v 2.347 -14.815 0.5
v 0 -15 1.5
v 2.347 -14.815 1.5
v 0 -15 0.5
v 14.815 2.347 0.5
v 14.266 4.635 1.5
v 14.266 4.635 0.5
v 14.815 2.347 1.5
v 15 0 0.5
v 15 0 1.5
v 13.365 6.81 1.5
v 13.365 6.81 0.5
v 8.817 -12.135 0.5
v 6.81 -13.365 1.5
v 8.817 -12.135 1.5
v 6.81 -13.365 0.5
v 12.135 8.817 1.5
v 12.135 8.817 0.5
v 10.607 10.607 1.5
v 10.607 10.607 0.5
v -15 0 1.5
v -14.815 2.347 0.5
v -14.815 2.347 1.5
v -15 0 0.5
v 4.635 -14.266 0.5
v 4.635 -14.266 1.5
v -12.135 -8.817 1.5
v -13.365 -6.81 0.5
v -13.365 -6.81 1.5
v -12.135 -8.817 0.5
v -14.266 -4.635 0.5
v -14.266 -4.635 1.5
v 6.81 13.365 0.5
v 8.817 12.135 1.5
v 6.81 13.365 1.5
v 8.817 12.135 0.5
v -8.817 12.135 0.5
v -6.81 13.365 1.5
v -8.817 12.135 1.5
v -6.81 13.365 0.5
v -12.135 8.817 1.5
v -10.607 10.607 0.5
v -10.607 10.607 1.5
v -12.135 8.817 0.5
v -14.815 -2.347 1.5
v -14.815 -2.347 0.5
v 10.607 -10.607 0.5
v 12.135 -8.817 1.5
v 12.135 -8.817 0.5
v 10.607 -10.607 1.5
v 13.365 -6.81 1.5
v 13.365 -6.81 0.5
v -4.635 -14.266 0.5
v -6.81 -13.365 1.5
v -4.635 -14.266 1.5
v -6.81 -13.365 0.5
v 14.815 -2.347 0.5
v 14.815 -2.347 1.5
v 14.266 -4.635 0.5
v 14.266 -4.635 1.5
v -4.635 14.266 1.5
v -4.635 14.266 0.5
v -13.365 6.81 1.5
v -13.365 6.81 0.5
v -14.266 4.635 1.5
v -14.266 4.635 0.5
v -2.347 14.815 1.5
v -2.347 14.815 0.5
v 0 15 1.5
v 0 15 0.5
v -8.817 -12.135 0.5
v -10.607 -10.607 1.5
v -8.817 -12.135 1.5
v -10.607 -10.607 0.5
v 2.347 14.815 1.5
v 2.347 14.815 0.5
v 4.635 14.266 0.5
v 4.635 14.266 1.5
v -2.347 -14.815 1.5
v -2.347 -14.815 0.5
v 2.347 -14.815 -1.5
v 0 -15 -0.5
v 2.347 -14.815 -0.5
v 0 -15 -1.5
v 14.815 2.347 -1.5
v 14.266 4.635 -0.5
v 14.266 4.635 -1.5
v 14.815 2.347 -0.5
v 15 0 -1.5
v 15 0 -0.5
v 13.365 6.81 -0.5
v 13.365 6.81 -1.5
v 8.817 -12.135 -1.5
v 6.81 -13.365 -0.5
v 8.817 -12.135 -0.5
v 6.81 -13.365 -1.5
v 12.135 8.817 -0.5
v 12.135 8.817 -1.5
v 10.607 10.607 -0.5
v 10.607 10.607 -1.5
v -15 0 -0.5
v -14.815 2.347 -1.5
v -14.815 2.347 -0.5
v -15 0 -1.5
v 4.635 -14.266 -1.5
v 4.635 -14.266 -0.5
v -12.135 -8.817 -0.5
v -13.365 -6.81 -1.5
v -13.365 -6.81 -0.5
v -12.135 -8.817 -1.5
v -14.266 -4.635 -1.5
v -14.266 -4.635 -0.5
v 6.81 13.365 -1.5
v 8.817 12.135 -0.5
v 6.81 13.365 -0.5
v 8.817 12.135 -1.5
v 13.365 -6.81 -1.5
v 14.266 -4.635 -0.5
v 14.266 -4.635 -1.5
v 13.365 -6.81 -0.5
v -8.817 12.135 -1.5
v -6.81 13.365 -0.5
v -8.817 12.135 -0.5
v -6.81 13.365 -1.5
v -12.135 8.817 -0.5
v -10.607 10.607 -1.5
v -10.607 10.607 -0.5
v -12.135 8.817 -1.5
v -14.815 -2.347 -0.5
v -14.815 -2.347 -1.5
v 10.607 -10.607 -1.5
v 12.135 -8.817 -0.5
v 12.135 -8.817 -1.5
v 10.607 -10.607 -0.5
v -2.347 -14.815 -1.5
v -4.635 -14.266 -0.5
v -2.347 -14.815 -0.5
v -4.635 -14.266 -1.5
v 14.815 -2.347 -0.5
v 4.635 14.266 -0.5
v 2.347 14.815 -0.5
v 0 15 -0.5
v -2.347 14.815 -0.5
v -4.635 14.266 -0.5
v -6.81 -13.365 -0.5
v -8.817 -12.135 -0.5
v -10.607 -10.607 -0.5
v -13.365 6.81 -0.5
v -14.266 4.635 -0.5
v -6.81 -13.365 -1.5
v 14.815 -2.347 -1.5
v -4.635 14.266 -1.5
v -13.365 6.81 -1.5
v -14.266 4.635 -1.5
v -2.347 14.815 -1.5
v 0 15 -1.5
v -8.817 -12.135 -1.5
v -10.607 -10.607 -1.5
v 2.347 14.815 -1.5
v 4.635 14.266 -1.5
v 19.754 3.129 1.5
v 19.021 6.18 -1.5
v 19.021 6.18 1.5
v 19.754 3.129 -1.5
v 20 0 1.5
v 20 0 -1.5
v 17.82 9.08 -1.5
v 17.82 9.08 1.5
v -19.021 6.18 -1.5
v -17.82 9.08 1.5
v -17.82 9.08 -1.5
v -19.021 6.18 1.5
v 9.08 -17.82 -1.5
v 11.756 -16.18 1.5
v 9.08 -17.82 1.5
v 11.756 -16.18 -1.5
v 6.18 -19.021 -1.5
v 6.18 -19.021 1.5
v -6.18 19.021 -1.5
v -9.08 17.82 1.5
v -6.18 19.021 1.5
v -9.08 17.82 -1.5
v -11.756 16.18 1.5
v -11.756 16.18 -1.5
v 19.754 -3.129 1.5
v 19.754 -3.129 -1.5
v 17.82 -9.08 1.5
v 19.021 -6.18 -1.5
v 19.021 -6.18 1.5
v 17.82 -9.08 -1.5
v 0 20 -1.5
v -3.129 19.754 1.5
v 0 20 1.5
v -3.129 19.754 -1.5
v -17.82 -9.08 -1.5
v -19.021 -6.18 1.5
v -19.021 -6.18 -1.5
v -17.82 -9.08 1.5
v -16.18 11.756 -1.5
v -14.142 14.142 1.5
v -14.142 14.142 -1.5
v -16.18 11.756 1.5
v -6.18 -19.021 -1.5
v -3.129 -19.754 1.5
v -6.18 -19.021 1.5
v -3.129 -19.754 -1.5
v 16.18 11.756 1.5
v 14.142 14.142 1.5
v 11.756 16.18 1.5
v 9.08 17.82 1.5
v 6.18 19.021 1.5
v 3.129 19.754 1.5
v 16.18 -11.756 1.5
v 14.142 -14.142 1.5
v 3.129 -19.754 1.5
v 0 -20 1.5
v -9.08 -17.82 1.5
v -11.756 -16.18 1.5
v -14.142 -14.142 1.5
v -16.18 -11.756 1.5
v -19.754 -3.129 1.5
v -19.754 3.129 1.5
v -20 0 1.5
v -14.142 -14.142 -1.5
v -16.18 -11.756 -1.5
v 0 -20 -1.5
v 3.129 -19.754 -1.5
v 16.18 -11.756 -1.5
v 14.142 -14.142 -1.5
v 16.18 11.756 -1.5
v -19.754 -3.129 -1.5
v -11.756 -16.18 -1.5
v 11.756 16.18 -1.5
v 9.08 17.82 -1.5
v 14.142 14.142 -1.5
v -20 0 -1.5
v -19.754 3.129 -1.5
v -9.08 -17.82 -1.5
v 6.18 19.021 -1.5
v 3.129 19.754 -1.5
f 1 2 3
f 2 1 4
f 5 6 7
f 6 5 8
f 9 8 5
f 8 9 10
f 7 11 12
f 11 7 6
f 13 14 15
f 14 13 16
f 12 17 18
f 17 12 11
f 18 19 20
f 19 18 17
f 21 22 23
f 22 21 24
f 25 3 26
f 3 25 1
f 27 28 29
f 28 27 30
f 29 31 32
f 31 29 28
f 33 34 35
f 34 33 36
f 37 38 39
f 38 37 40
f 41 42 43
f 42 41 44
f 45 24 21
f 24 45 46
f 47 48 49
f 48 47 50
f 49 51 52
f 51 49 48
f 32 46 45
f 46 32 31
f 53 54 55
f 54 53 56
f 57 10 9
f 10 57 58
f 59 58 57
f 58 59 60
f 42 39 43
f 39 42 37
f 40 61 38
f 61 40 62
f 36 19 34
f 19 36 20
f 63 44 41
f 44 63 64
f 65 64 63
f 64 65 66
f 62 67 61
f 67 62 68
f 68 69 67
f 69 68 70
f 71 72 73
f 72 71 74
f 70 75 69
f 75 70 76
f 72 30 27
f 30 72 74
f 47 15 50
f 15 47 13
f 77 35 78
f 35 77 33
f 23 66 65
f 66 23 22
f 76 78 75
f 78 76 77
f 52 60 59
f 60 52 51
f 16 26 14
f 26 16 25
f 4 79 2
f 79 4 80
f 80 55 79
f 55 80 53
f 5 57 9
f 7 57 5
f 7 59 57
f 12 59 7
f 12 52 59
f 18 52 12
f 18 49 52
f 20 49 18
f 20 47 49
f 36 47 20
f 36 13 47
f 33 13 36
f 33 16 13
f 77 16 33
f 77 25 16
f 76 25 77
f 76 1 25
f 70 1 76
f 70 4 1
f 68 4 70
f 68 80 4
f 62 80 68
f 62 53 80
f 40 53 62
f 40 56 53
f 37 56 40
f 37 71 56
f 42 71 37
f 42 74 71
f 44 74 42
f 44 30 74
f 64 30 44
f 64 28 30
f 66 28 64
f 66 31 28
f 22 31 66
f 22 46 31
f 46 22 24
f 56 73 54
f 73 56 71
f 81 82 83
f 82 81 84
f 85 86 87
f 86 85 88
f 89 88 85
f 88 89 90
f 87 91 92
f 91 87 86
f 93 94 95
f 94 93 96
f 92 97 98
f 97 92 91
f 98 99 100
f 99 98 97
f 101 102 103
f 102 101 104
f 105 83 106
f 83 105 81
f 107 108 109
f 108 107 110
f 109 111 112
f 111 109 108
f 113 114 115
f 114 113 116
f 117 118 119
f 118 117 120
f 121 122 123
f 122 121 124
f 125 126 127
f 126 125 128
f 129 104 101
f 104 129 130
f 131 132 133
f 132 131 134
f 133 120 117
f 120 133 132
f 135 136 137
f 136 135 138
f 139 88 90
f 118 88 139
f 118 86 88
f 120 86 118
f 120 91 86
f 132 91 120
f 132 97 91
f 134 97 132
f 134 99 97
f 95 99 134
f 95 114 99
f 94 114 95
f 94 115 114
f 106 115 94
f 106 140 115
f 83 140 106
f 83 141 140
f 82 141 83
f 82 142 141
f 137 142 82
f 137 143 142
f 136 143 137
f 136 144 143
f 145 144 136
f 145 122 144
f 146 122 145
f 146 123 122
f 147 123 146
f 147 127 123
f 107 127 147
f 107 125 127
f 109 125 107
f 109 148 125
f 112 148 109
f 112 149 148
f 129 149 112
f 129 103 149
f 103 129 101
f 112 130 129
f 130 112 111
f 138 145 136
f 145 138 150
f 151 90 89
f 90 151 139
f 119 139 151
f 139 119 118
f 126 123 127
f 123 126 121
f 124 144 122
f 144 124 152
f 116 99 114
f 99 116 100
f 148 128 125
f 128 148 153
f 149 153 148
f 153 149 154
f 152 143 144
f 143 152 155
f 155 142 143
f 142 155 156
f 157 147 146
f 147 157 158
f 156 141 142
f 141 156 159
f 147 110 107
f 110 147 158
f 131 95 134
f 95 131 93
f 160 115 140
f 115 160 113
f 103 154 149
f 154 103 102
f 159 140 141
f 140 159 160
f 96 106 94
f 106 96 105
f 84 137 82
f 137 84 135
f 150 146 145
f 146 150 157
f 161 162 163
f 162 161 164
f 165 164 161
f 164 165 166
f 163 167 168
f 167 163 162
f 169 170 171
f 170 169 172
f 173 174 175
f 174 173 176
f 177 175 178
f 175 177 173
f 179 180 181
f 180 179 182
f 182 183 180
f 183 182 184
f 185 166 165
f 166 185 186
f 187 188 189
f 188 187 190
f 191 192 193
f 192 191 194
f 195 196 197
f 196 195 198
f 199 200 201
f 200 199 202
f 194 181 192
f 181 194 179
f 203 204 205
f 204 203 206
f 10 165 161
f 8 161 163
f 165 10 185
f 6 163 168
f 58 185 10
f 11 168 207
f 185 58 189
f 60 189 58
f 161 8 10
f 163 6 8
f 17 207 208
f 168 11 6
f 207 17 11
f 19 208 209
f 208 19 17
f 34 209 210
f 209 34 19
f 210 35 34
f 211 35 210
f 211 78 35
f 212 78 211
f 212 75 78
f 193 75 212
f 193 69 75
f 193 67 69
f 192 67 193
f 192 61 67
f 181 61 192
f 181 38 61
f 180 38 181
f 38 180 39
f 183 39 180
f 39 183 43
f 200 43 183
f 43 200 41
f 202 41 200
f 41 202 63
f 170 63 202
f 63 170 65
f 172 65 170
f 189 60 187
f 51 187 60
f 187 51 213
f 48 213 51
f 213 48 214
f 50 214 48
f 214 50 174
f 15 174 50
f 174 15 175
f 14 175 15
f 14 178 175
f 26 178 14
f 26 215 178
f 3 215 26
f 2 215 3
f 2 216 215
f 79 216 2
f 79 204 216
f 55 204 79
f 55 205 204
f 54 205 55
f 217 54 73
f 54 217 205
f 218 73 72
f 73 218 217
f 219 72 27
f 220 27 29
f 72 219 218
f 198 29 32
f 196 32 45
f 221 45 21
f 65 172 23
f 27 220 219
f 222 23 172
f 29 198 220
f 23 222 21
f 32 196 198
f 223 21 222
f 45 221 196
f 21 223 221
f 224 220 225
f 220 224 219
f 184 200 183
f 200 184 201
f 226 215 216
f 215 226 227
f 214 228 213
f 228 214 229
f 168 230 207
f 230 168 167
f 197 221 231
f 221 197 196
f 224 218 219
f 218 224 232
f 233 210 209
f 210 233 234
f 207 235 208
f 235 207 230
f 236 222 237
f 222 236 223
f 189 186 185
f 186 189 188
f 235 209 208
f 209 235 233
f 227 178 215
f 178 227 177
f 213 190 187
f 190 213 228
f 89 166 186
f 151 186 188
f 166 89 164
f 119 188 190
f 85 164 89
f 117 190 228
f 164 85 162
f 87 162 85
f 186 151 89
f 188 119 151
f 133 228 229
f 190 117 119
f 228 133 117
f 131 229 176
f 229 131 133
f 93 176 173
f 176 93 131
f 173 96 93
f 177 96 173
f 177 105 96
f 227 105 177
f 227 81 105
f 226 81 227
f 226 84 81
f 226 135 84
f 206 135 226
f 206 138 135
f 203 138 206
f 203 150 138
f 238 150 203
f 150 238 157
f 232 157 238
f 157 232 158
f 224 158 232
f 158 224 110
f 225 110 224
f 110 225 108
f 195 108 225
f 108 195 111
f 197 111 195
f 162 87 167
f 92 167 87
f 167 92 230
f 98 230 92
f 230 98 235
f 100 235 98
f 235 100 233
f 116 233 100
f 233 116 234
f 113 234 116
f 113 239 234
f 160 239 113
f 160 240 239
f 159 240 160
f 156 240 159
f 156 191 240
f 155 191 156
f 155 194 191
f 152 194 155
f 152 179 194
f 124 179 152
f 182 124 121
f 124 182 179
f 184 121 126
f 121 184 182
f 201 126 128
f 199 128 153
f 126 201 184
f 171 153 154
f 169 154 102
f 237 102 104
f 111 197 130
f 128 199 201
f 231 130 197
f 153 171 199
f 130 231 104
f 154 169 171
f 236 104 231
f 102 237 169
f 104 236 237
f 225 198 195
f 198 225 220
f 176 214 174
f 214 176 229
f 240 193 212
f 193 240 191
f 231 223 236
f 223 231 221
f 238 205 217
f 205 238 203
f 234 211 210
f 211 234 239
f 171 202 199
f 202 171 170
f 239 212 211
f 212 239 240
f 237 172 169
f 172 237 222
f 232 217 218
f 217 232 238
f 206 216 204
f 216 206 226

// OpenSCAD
module Coin_01(Mat = 0){

    //Color = [Main Body, Pocket] 
    bronze = ["#CD7F32","#7b4c1e"]; 
    silver = ["#c4aead","#cdc9c9"];
    gold = ["#ffd700","#daa520"];

    Material = [bronze,silver,gold];

    difference(){
            // Coin Main Body
            color(Material[Mat][0])
            cylinder(3,20,20, center= true, $fn = 40);
            
            // Make Pocket Hole
            color(Material[Mat][1]){   
            translate([0,0,2])
            cylinder(3,15,15, center= true, $fn = 40);
                 
            translate([0,0,-2])
            cylinder(3,15,15, center= true, $fn = 40);
            }

        }
}

Coin_01(Mat = 2);

// Written by Nicolì Angelo (Gengio) 2024: 
// MIT License

//Permission is hereby granted, free of charge, to any person obtaining a copy of this software and associated documentation files (the "Software"), to deal in the Software without restriction, including without limitation the rights to use, copy, modify, merge, publish, distribute, sublicense, and/or sell copies of the Software, and to permit persons to whom the Software is furnished to do so, subject to the following conditions:

//The above copyright notice and this permission notice shall be included in all copies or substantial portions of the Software.

//THE SOFTWARE IS PROVIDED "AS IS", WITHOUT WARRANTY OF ANY KIND, EXPRESS OR IMPLIED, INCLUDING BUT NOT LIMITED TO THE WARRANTIES OF MERCHANTABILITY, FITNESS FOR A PARTICULAR PURPOSE AND NONINFRINGEMENT. IN NO EVENT SHALL THE AUTHORS OR COPYRIGHT HOLDERS BE LIABLE FOR ANY CLAIM, DAMAGES OR OTHER LIABILITY, WHETHER IN AN ACTION OF CONTRACT, TORT OR OTHERWISE, ARISING FROM, OUT OF OR IN CONNECTION WITH THE SOFTWARE OR THE USE OR OTHER DEALINGS IN THE SOFTWARE.
